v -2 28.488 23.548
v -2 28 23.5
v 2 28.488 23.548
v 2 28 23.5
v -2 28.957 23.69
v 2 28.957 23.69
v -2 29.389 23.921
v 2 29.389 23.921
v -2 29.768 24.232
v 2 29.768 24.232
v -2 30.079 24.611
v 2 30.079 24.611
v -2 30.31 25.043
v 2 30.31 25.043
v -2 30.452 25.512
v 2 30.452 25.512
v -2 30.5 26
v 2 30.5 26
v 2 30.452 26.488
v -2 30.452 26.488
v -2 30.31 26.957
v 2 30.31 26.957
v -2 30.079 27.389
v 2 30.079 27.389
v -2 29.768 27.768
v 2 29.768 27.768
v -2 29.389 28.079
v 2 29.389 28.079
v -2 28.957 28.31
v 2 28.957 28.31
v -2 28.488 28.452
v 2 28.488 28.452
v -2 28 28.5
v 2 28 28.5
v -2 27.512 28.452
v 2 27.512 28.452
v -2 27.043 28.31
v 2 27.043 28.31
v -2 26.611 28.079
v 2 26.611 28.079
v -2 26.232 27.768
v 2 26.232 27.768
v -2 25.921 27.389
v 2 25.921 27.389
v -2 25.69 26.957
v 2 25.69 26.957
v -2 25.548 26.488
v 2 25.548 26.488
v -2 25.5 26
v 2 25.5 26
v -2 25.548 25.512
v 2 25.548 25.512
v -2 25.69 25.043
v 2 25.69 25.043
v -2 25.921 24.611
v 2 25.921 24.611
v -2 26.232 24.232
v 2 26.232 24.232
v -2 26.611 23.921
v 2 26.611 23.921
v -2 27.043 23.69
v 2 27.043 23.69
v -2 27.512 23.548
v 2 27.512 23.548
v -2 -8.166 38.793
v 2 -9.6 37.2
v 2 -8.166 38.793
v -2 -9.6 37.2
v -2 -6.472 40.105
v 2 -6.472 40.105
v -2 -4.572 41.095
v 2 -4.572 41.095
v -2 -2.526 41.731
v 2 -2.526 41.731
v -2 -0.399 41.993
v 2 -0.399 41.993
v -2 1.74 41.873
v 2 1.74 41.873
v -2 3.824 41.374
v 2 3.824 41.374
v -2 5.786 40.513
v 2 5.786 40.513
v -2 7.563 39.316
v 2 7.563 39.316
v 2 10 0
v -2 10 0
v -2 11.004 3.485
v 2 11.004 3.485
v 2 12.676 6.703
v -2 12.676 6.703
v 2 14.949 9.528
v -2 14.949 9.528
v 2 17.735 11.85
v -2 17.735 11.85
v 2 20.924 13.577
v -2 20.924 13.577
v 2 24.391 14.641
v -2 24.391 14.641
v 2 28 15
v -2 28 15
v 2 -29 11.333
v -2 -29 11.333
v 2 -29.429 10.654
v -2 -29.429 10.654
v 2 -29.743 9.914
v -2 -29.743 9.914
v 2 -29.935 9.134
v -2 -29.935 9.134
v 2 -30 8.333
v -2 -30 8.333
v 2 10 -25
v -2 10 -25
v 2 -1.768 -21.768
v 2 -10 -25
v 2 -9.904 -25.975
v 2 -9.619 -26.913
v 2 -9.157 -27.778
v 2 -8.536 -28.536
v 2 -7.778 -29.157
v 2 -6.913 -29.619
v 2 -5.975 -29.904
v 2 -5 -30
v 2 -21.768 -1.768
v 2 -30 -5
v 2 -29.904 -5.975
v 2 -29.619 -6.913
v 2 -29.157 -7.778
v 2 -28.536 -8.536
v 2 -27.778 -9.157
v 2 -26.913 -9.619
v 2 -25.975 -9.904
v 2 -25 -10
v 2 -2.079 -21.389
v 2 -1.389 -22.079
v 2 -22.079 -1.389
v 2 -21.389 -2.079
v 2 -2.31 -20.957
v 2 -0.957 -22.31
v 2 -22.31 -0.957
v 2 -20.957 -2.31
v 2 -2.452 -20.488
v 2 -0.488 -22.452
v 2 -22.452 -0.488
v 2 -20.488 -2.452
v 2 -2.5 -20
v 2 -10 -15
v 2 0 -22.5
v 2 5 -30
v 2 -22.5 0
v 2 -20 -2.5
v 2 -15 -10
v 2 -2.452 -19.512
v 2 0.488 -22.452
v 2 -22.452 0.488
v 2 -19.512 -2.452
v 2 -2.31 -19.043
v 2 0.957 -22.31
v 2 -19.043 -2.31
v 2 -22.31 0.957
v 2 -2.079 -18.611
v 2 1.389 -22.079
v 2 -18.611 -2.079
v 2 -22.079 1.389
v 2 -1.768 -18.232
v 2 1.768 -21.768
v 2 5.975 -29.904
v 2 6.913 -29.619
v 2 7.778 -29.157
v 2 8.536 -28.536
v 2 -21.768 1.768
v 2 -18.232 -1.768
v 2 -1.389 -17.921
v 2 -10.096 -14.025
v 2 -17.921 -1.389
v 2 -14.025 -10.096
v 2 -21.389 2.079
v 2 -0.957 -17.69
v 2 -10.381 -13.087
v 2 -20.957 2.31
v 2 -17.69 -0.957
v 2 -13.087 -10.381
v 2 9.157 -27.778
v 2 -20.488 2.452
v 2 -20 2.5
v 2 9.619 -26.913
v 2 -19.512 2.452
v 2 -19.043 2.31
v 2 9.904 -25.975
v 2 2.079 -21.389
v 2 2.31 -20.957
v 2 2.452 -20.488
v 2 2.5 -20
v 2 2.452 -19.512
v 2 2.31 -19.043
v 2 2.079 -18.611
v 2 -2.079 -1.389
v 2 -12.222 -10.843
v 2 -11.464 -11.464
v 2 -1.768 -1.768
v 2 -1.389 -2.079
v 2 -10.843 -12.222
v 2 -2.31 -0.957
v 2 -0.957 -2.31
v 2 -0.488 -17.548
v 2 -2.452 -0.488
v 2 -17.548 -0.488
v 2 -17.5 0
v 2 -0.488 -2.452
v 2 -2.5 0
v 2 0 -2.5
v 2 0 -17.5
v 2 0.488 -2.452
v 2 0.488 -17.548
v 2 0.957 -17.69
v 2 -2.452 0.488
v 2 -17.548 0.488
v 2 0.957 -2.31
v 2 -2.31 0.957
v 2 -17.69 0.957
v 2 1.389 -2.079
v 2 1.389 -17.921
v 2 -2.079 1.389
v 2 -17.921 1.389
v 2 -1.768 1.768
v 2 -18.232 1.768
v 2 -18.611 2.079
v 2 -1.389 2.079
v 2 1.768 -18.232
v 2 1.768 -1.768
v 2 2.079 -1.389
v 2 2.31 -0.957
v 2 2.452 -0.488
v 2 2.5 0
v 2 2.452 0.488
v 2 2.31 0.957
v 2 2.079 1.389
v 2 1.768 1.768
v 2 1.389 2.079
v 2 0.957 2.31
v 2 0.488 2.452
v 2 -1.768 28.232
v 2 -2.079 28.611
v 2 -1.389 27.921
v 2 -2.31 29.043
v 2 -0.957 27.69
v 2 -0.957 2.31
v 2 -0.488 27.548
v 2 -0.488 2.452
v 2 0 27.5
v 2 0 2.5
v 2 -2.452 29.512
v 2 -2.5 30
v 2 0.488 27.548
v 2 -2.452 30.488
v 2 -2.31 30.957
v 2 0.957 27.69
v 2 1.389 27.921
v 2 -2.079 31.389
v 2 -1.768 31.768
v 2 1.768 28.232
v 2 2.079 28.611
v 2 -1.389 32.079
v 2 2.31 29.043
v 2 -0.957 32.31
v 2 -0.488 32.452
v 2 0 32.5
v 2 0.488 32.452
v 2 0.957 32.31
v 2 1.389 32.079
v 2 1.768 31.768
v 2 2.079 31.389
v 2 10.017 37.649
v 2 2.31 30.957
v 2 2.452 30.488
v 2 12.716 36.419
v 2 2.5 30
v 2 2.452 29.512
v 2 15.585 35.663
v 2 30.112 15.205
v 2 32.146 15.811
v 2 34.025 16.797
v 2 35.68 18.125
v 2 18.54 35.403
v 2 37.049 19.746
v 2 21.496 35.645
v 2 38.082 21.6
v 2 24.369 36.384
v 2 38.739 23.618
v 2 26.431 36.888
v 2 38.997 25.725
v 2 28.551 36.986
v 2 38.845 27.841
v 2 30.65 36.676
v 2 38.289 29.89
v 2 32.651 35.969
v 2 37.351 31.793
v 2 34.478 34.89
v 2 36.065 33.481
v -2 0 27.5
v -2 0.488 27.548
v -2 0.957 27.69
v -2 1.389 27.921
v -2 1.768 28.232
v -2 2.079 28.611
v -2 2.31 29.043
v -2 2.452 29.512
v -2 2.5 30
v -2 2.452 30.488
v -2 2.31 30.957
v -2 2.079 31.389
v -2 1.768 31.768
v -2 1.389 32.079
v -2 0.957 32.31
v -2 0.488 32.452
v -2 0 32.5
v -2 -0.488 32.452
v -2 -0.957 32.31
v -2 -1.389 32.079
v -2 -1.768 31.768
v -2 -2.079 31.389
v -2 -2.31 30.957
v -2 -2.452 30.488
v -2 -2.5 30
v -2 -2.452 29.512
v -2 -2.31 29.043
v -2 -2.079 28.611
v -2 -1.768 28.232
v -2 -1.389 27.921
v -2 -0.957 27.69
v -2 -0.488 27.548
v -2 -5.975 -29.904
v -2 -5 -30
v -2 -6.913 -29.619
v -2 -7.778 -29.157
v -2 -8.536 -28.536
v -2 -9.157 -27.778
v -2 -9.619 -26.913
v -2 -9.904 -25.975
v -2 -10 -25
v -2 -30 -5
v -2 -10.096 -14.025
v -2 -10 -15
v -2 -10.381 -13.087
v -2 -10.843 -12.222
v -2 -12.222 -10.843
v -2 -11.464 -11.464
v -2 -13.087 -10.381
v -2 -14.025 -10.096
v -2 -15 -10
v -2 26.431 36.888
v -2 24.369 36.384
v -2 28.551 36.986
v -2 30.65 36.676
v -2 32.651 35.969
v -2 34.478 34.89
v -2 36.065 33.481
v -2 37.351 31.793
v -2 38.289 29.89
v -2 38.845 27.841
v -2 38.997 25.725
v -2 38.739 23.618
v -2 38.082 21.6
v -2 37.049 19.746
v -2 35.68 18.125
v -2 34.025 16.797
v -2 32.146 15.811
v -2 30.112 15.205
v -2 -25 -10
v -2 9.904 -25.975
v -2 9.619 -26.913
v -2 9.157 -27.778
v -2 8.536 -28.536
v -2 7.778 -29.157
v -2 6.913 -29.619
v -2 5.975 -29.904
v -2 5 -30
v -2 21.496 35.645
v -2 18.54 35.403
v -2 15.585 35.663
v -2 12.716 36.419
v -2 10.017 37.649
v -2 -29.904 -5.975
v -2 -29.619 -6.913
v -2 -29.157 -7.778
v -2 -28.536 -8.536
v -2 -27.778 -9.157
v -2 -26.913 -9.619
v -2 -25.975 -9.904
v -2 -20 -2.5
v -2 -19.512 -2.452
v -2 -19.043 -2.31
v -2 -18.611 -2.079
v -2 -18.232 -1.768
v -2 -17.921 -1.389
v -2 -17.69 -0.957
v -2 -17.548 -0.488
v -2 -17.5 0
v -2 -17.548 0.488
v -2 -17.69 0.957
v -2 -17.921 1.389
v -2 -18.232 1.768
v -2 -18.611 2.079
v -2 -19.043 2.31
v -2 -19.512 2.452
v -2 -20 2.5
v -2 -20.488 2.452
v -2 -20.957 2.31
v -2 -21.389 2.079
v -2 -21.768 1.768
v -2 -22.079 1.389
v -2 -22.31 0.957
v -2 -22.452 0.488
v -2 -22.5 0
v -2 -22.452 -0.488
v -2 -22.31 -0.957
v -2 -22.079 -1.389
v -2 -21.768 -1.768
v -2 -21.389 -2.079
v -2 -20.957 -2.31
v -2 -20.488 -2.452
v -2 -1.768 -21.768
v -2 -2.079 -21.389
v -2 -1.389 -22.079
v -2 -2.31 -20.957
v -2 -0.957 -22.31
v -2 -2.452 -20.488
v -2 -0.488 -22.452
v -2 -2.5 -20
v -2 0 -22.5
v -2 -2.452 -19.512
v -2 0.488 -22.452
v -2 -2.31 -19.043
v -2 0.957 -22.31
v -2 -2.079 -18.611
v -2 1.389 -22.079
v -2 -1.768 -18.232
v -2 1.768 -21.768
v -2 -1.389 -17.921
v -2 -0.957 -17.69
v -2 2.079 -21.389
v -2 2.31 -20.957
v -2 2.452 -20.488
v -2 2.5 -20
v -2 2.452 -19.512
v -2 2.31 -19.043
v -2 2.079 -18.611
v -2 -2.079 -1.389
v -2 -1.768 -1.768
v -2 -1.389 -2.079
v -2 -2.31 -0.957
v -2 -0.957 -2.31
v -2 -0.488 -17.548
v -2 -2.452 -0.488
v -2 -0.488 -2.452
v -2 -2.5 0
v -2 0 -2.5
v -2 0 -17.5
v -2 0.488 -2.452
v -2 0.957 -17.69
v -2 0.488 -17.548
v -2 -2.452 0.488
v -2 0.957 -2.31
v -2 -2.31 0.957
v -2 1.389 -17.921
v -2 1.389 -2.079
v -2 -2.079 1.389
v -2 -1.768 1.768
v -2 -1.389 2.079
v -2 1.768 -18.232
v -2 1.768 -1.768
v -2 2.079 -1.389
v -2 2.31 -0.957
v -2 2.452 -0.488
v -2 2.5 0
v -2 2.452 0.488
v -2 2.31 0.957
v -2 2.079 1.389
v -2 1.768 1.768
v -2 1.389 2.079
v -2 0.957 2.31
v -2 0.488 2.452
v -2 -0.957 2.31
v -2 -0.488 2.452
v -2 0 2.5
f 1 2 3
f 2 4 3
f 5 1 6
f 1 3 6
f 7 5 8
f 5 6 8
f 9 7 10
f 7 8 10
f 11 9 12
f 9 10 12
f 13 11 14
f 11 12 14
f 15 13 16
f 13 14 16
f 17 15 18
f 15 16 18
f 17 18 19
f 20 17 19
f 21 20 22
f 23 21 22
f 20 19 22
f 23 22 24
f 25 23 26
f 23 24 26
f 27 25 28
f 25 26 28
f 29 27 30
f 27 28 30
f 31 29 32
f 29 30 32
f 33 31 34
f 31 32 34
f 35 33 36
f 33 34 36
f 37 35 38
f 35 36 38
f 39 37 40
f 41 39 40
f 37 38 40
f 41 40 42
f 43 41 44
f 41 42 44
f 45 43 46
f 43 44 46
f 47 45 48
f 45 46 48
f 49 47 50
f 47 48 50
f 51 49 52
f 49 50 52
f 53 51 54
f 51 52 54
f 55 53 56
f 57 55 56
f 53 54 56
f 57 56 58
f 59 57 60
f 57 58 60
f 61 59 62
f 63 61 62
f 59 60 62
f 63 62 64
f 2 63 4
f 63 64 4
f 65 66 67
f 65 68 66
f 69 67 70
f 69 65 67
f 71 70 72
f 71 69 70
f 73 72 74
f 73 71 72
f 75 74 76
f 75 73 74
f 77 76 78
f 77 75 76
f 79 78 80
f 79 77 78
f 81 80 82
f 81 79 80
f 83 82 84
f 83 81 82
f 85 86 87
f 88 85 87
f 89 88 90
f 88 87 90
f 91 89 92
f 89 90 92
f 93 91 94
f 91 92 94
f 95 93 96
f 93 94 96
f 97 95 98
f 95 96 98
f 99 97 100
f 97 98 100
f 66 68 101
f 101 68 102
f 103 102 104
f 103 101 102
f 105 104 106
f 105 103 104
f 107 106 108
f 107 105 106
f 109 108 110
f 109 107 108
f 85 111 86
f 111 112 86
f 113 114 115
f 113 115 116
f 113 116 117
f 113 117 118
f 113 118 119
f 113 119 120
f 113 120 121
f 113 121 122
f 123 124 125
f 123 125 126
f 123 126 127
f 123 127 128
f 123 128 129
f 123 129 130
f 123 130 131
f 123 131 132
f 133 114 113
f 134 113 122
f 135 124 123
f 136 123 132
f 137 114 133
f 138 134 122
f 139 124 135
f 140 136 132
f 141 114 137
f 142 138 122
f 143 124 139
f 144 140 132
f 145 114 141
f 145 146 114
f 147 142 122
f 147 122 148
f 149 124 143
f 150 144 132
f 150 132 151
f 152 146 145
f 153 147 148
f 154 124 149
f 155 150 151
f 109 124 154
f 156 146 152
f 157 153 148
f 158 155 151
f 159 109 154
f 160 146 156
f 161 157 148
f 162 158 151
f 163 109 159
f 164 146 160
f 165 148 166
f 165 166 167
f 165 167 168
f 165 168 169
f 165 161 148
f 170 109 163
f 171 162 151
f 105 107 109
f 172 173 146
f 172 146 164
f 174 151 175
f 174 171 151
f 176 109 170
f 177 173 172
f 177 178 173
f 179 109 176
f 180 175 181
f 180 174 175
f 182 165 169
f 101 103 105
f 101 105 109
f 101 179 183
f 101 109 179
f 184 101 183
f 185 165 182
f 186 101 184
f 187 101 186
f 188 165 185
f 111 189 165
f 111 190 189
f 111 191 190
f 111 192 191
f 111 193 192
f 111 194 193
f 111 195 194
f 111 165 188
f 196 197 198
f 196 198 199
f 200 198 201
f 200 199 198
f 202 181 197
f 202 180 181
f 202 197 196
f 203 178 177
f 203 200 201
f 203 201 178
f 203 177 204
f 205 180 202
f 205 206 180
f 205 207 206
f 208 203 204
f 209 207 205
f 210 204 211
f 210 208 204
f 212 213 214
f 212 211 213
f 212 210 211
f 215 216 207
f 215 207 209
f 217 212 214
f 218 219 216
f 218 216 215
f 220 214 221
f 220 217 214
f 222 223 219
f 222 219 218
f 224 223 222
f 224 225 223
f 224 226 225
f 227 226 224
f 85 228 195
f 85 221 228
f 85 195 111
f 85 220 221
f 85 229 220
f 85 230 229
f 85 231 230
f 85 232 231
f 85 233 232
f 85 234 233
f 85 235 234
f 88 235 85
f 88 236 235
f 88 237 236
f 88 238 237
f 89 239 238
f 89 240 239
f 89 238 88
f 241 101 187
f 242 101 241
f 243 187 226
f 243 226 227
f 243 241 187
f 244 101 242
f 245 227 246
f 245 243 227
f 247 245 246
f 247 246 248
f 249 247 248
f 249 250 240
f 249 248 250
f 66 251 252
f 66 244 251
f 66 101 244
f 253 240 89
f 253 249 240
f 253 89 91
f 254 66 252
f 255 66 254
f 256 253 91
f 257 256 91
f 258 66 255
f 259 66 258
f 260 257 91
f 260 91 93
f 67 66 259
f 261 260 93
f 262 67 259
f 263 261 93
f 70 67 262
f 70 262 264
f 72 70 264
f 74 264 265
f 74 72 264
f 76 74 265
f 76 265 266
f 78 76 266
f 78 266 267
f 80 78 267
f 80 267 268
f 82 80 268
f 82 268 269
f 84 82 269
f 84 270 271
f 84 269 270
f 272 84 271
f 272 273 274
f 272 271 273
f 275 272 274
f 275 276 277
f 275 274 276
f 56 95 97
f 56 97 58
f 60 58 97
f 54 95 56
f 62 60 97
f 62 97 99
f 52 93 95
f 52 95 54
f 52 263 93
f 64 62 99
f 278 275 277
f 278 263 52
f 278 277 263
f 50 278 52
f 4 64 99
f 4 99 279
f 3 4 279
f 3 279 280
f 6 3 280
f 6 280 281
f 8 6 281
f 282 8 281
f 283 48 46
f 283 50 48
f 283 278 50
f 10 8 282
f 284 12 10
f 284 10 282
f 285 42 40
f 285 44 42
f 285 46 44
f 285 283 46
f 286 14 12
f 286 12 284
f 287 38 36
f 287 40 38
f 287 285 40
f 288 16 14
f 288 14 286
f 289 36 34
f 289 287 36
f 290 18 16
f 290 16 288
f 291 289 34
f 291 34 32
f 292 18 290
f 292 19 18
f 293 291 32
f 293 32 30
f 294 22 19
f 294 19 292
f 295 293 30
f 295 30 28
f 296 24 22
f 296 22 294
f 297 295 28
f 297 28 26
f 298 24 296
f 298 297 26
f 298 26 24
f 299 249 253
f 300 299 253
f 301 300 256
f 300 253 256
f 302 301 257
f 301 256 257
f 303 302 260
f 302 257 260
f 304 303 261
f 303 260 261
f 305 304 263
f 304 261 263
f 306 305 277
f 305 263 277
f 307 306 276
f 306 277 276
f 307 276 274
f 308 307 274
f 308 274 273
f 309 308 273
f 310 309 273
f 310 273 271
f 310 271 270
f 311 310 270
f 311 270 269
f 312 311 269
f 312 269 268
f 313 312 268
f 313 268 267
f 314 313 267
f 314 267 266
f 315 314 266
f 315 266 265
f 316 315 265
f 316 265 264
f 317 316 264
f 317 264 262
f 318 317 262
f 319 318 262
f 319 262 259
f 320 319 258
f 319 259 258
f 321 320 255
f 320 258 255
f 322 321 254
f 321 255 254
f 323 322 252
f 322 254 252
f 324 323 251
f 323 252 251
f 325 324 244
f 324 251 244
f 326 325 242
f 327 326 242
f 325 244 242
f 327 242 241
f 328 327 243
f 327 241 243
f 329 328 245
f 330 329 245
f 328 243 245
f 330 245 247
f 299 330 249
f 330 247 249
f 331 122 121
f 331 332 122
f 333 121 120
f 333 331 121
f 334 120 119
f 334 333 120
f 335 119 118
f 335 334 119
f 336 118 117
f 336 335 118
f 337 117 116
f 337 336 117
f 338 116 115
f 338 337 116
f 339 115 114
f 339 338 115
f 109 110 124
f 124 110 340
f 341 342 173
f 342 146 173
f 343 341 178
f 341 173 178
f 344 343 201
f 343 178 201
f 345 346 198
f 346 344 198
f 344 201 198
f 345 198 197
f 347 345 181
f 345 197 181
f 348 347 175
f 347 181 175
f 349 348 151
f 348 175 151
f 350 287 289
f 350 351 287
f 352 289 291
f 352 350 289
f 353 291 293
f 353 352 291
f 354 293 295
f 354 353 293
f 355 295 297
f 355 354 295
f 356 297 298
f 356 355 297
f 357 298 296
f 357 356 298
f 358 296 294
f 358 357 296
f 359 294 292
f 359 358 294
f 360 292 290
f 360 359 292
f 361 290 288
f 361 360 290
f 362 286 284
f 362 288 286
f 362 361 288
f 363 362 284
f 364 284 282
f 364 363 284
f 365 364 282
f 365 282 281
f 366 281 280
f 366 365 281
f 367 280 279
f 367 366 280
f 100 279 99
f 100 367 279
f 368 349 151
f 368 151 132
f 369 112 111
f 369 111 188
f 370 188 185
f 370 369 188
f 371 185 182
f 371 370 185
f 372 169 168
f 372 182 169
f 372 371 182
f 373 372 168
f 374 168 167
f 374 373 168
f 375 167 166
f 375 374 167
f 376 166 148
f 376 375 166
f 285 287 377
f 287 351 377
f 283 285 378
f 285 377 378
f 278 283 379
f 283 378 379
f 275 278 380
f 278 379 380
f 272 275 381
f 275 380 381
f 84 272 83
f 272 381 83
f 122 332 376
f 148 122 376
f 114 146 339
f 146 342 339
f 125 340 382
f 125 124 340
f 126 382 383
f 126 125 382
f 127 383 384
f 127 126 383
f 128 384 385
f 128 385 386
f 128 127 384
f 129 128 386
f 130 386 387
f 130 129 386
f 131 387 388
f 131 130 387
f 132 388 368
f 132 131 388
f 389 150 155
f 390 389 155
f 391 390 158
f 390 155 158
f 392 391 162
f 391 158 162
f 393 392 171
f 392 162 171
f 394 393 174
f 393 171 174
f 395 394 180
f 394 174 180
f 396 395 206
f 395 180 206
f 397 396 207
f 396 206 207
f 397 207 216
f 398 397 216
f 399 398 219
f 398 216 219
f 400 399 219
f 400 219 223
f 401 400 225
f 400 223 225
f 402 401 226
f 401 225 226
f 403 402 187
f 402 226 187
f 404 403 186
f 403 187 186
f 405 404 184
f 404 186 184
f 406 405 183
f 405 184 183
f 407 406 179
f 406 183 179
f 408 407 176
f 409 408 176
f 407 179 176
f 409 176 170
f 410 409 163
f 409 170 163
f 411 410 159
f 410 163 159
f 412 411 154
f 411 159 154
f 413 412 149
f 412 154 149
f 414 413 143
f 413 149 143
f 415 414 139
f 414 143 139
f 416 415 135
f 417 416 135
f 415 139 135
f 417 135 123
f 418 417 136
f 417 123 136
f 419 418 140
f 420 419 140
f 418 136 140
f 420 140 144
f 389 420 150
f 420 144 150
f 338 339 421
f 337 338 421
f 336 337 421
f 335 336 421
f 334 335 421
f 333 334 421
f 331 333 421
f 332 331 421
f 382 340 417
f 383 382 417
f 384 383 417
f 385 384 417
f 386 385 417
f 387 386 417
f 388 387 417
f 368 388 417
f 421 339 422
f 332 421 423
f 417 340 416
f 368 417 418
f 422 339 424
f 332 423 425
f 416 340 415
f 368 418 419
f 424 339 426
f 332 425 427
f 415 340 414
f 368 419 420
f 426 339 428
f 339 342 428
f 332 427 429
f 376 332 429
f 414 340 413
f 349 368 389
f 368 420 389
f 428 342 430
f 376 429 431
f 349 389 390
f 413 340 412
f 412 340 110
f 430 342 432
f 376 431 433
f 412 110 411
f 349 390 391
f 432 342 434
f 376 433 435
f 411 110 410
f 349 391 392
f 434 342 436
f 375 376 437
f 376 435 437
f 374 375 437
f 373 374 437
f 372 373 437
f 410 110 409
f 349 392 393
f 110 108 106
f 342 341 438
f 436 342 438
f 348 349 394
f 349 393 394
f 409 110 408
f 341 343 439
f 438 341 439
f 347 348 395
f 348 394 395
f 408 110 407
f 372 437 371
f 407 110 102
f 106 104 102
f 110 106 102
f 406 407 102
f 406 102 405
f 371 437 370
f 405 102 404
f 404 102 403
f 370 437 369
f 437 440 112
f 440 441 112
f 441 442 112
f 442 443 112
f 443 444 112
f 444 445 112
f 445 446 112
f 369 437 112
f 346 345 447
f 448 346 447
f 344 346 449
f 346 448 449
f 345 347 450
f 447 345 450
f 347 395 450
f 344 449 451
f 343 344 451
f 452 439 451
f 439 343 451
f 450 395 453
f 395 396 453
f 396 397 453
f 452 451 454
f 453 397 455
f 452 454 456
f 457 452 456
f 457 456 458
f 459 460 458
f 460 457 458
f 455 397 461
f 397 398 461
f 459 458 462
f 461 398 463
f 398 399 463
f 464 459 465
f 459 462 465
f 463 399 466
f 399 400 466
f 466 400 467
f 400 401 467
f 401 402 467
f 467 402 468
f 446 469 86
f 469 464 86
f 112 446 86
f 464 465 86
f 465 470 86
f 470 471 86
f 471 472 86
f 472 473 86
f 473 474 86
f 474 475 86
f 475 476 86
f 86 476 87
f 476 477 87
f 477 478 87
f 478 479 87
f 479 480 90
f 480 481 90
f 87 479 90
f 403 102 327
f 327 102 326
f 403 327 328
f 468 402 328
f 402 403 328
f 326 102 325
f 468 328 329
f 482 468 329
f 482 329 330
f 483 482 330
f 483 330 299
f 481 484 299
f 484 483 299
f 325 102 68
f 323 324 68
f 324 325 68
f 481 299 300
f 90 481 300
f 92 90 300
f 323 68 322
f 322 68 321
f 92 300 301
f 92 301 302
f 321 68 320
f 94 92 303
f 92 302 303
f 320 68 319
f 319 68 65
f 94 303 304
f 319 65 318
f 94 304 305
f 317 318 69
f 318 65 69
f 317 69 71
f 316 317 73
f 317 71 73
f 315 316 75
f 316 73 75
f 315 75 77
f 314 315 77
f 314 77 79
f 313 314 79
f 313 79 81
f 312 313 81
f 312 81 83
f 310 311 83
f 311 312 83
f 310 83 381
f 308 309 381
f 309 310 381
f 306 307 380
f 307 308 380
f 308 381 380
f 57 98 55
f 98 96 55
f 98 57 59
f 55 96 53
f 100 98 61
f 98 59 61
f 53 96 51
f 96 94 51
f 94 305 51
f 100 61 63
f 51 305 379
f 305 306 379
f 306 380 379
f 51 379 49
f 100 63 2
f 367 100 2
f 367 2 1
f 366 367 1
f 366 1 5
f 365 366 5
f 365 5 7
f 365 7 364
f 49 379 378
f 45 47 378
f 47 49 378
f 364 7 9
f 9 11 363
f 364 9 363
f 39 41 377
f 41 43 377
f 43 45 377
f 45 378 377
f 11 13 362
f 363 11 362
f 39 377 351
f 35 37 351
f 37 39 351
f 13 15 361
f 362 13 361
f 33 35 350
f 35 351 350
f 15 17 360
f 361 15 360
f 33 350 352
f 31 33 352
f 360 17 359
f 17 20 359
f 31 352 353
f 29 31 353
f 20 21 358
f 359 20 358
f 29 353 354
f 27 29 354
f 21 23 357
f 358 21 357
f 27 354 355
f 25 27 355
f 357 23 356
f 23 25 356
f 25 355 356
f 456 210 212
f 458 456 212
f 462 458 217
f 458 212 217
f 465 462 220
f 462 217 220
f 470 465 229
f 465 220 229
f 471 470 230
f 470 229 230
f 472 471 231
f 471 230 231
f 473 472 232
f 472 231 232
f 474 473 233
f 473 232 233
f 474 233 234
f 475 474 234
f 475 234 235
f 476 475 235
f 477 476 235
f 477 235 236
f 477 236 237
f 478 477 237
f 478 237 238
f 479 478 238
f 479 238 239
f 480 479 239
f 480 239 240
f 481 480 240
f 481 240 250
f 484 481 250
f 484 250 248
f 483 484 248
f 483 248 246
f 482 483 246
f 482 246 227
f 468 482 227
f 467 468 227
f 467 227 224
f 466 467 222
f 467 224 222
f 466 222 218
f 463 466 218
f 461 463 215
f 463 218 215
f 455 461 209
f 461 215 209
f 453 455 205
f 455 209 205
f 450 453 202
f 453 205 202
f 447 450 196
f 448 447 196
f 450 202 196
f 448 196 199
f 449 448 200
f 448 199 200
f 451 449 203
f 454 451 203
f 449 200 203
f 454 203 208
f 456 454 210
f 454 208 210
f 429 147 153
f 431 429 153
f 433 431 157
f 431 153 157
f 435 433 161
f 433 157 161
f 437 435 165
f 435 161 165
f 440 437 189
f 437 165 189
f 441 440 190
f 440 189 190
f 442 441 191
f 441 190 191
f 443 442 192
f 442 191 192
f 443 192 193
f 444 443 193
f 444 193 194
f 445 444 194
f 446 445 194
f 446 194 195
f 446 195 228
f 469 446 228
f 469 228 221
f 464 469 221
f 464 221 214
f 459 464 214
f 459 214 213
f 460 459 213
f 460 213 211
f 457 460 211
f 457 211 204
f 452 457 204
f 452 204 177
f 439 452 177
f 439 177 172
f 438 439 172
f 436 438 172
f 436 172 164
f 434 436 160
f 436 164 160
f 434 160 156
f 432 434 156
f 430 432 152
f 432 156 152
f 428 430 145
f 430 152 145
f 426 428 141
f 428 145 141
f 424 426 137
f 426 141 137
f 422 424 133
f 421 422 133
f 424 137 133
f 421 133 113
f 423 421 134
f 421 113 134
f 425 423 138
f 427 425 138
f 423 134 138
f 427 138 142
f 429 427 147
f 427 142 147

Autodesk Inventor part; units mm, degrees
ref_plane "YZ Plane" through (0, 0, 0) normal (1, 0, 0) x (0, 1, 0)
ref_plane "XZ Plane" through (0, 0, 0) normal (0, 1, 0) x (-1, 0, 0)
ref_plane "XY Plane" through (0, 0, 0) normal (0, 0, 1) x (1, 0, 0)
sketch "Skizze1" plane through (0, 0, 0) normal (1, 0, 0) x (0, 1, 0)
  line L0 (-30, 10) -> (-30, -10)
  arc A0 (28, 15) -> (24.3693, 36.3836) centre (28, 26) ccw
  line L1 (-9.6, 37.2) -> (-30, 10)
  line L2 (10, -3) -> (10, 0)
  arc A1 (28, 15) -> (10, 0) centre (28, -3.3) ccw
  line L3 (-10, -30) -> (10, -30)
  line L4 (10, -30) -> (10, 0)
  line L5 (-10, -10) -> (-30, -10)
  line L6 (-10, -10) -> (-10, -30)
  arc A2 (7.5634, 39.3164) -> (24.3693, 36.3836) centre (18.5933, 52.9028) ccw
  arc A3 (7.5634, 39.3164) -> (-9.6, 37.2) centre (0, 30) ccw
  point P0 (0, 0)
  point P1 (-30, 0)
  dimension "d16" = 22
  dimension "d22" = 10
  dimension "d23" = 18
  dimension "d26" = 30
  dimension "d31" = 20
  dimension "d34" = 26
  dimension "d35" = 10
  dimension "d36" = 20
  dimension "d37" = 18
  dimension "d38" = 18
  dimension "d39" = 0
  dimension "d40" = 30
  dimension "d43" = 35
  dimension "d44" = 12
  dimension "d46" = 0
extrude "Extrusion1" add sketch "Skizze1" along normal mid plane 4
sketch "Skizze2" plane through (2, 0, 0) normal (1, 0, 0) x (0, 0, -1)
  circle A0 centre (-26, 28) radius 2.5
  circle A1 centre (0, 0) radius 2.5
  circle A2 centre (20, 0) radius 2.5
  circle A3 centre (0, -20) radius 2.5
  line L0 (-10, -30) -> (10, -30) projected
  line L1 (30, -10) -> (30, 10) projected
  arc A4 (-15, 28) -> (-36.3836, 24.3693) centre (-26, 28) ccw projected
  circle A5 centre (-30, 0) radius 2.5
  arc A6 (-39.3164, 7.5634) -> (-37.2, -9.6) centre (-30, 0) ccw projected
  point P0 (10, -27)
  point P1 (-36.9988, 28.1611)
  point P2 (-44.9983, -10.001)
  dimension "d8" = 5
  dimension "d9" = 5
  dimension "d10" = 5
  dimension "d11" = 10
  dimension "d32" = 10
  dimension "d45" = 5
extrude "Extrusion2" cut sketch "Skizze2" along normal through all both and the other way through all
fillet "Fillet1" radius 5 5 edges at (0, -30, -10) (0, -10, -10) (0, -10, -30) (0, 10, -30) (0, -30, 10)
properties part number "KettenBlech_Oben"
